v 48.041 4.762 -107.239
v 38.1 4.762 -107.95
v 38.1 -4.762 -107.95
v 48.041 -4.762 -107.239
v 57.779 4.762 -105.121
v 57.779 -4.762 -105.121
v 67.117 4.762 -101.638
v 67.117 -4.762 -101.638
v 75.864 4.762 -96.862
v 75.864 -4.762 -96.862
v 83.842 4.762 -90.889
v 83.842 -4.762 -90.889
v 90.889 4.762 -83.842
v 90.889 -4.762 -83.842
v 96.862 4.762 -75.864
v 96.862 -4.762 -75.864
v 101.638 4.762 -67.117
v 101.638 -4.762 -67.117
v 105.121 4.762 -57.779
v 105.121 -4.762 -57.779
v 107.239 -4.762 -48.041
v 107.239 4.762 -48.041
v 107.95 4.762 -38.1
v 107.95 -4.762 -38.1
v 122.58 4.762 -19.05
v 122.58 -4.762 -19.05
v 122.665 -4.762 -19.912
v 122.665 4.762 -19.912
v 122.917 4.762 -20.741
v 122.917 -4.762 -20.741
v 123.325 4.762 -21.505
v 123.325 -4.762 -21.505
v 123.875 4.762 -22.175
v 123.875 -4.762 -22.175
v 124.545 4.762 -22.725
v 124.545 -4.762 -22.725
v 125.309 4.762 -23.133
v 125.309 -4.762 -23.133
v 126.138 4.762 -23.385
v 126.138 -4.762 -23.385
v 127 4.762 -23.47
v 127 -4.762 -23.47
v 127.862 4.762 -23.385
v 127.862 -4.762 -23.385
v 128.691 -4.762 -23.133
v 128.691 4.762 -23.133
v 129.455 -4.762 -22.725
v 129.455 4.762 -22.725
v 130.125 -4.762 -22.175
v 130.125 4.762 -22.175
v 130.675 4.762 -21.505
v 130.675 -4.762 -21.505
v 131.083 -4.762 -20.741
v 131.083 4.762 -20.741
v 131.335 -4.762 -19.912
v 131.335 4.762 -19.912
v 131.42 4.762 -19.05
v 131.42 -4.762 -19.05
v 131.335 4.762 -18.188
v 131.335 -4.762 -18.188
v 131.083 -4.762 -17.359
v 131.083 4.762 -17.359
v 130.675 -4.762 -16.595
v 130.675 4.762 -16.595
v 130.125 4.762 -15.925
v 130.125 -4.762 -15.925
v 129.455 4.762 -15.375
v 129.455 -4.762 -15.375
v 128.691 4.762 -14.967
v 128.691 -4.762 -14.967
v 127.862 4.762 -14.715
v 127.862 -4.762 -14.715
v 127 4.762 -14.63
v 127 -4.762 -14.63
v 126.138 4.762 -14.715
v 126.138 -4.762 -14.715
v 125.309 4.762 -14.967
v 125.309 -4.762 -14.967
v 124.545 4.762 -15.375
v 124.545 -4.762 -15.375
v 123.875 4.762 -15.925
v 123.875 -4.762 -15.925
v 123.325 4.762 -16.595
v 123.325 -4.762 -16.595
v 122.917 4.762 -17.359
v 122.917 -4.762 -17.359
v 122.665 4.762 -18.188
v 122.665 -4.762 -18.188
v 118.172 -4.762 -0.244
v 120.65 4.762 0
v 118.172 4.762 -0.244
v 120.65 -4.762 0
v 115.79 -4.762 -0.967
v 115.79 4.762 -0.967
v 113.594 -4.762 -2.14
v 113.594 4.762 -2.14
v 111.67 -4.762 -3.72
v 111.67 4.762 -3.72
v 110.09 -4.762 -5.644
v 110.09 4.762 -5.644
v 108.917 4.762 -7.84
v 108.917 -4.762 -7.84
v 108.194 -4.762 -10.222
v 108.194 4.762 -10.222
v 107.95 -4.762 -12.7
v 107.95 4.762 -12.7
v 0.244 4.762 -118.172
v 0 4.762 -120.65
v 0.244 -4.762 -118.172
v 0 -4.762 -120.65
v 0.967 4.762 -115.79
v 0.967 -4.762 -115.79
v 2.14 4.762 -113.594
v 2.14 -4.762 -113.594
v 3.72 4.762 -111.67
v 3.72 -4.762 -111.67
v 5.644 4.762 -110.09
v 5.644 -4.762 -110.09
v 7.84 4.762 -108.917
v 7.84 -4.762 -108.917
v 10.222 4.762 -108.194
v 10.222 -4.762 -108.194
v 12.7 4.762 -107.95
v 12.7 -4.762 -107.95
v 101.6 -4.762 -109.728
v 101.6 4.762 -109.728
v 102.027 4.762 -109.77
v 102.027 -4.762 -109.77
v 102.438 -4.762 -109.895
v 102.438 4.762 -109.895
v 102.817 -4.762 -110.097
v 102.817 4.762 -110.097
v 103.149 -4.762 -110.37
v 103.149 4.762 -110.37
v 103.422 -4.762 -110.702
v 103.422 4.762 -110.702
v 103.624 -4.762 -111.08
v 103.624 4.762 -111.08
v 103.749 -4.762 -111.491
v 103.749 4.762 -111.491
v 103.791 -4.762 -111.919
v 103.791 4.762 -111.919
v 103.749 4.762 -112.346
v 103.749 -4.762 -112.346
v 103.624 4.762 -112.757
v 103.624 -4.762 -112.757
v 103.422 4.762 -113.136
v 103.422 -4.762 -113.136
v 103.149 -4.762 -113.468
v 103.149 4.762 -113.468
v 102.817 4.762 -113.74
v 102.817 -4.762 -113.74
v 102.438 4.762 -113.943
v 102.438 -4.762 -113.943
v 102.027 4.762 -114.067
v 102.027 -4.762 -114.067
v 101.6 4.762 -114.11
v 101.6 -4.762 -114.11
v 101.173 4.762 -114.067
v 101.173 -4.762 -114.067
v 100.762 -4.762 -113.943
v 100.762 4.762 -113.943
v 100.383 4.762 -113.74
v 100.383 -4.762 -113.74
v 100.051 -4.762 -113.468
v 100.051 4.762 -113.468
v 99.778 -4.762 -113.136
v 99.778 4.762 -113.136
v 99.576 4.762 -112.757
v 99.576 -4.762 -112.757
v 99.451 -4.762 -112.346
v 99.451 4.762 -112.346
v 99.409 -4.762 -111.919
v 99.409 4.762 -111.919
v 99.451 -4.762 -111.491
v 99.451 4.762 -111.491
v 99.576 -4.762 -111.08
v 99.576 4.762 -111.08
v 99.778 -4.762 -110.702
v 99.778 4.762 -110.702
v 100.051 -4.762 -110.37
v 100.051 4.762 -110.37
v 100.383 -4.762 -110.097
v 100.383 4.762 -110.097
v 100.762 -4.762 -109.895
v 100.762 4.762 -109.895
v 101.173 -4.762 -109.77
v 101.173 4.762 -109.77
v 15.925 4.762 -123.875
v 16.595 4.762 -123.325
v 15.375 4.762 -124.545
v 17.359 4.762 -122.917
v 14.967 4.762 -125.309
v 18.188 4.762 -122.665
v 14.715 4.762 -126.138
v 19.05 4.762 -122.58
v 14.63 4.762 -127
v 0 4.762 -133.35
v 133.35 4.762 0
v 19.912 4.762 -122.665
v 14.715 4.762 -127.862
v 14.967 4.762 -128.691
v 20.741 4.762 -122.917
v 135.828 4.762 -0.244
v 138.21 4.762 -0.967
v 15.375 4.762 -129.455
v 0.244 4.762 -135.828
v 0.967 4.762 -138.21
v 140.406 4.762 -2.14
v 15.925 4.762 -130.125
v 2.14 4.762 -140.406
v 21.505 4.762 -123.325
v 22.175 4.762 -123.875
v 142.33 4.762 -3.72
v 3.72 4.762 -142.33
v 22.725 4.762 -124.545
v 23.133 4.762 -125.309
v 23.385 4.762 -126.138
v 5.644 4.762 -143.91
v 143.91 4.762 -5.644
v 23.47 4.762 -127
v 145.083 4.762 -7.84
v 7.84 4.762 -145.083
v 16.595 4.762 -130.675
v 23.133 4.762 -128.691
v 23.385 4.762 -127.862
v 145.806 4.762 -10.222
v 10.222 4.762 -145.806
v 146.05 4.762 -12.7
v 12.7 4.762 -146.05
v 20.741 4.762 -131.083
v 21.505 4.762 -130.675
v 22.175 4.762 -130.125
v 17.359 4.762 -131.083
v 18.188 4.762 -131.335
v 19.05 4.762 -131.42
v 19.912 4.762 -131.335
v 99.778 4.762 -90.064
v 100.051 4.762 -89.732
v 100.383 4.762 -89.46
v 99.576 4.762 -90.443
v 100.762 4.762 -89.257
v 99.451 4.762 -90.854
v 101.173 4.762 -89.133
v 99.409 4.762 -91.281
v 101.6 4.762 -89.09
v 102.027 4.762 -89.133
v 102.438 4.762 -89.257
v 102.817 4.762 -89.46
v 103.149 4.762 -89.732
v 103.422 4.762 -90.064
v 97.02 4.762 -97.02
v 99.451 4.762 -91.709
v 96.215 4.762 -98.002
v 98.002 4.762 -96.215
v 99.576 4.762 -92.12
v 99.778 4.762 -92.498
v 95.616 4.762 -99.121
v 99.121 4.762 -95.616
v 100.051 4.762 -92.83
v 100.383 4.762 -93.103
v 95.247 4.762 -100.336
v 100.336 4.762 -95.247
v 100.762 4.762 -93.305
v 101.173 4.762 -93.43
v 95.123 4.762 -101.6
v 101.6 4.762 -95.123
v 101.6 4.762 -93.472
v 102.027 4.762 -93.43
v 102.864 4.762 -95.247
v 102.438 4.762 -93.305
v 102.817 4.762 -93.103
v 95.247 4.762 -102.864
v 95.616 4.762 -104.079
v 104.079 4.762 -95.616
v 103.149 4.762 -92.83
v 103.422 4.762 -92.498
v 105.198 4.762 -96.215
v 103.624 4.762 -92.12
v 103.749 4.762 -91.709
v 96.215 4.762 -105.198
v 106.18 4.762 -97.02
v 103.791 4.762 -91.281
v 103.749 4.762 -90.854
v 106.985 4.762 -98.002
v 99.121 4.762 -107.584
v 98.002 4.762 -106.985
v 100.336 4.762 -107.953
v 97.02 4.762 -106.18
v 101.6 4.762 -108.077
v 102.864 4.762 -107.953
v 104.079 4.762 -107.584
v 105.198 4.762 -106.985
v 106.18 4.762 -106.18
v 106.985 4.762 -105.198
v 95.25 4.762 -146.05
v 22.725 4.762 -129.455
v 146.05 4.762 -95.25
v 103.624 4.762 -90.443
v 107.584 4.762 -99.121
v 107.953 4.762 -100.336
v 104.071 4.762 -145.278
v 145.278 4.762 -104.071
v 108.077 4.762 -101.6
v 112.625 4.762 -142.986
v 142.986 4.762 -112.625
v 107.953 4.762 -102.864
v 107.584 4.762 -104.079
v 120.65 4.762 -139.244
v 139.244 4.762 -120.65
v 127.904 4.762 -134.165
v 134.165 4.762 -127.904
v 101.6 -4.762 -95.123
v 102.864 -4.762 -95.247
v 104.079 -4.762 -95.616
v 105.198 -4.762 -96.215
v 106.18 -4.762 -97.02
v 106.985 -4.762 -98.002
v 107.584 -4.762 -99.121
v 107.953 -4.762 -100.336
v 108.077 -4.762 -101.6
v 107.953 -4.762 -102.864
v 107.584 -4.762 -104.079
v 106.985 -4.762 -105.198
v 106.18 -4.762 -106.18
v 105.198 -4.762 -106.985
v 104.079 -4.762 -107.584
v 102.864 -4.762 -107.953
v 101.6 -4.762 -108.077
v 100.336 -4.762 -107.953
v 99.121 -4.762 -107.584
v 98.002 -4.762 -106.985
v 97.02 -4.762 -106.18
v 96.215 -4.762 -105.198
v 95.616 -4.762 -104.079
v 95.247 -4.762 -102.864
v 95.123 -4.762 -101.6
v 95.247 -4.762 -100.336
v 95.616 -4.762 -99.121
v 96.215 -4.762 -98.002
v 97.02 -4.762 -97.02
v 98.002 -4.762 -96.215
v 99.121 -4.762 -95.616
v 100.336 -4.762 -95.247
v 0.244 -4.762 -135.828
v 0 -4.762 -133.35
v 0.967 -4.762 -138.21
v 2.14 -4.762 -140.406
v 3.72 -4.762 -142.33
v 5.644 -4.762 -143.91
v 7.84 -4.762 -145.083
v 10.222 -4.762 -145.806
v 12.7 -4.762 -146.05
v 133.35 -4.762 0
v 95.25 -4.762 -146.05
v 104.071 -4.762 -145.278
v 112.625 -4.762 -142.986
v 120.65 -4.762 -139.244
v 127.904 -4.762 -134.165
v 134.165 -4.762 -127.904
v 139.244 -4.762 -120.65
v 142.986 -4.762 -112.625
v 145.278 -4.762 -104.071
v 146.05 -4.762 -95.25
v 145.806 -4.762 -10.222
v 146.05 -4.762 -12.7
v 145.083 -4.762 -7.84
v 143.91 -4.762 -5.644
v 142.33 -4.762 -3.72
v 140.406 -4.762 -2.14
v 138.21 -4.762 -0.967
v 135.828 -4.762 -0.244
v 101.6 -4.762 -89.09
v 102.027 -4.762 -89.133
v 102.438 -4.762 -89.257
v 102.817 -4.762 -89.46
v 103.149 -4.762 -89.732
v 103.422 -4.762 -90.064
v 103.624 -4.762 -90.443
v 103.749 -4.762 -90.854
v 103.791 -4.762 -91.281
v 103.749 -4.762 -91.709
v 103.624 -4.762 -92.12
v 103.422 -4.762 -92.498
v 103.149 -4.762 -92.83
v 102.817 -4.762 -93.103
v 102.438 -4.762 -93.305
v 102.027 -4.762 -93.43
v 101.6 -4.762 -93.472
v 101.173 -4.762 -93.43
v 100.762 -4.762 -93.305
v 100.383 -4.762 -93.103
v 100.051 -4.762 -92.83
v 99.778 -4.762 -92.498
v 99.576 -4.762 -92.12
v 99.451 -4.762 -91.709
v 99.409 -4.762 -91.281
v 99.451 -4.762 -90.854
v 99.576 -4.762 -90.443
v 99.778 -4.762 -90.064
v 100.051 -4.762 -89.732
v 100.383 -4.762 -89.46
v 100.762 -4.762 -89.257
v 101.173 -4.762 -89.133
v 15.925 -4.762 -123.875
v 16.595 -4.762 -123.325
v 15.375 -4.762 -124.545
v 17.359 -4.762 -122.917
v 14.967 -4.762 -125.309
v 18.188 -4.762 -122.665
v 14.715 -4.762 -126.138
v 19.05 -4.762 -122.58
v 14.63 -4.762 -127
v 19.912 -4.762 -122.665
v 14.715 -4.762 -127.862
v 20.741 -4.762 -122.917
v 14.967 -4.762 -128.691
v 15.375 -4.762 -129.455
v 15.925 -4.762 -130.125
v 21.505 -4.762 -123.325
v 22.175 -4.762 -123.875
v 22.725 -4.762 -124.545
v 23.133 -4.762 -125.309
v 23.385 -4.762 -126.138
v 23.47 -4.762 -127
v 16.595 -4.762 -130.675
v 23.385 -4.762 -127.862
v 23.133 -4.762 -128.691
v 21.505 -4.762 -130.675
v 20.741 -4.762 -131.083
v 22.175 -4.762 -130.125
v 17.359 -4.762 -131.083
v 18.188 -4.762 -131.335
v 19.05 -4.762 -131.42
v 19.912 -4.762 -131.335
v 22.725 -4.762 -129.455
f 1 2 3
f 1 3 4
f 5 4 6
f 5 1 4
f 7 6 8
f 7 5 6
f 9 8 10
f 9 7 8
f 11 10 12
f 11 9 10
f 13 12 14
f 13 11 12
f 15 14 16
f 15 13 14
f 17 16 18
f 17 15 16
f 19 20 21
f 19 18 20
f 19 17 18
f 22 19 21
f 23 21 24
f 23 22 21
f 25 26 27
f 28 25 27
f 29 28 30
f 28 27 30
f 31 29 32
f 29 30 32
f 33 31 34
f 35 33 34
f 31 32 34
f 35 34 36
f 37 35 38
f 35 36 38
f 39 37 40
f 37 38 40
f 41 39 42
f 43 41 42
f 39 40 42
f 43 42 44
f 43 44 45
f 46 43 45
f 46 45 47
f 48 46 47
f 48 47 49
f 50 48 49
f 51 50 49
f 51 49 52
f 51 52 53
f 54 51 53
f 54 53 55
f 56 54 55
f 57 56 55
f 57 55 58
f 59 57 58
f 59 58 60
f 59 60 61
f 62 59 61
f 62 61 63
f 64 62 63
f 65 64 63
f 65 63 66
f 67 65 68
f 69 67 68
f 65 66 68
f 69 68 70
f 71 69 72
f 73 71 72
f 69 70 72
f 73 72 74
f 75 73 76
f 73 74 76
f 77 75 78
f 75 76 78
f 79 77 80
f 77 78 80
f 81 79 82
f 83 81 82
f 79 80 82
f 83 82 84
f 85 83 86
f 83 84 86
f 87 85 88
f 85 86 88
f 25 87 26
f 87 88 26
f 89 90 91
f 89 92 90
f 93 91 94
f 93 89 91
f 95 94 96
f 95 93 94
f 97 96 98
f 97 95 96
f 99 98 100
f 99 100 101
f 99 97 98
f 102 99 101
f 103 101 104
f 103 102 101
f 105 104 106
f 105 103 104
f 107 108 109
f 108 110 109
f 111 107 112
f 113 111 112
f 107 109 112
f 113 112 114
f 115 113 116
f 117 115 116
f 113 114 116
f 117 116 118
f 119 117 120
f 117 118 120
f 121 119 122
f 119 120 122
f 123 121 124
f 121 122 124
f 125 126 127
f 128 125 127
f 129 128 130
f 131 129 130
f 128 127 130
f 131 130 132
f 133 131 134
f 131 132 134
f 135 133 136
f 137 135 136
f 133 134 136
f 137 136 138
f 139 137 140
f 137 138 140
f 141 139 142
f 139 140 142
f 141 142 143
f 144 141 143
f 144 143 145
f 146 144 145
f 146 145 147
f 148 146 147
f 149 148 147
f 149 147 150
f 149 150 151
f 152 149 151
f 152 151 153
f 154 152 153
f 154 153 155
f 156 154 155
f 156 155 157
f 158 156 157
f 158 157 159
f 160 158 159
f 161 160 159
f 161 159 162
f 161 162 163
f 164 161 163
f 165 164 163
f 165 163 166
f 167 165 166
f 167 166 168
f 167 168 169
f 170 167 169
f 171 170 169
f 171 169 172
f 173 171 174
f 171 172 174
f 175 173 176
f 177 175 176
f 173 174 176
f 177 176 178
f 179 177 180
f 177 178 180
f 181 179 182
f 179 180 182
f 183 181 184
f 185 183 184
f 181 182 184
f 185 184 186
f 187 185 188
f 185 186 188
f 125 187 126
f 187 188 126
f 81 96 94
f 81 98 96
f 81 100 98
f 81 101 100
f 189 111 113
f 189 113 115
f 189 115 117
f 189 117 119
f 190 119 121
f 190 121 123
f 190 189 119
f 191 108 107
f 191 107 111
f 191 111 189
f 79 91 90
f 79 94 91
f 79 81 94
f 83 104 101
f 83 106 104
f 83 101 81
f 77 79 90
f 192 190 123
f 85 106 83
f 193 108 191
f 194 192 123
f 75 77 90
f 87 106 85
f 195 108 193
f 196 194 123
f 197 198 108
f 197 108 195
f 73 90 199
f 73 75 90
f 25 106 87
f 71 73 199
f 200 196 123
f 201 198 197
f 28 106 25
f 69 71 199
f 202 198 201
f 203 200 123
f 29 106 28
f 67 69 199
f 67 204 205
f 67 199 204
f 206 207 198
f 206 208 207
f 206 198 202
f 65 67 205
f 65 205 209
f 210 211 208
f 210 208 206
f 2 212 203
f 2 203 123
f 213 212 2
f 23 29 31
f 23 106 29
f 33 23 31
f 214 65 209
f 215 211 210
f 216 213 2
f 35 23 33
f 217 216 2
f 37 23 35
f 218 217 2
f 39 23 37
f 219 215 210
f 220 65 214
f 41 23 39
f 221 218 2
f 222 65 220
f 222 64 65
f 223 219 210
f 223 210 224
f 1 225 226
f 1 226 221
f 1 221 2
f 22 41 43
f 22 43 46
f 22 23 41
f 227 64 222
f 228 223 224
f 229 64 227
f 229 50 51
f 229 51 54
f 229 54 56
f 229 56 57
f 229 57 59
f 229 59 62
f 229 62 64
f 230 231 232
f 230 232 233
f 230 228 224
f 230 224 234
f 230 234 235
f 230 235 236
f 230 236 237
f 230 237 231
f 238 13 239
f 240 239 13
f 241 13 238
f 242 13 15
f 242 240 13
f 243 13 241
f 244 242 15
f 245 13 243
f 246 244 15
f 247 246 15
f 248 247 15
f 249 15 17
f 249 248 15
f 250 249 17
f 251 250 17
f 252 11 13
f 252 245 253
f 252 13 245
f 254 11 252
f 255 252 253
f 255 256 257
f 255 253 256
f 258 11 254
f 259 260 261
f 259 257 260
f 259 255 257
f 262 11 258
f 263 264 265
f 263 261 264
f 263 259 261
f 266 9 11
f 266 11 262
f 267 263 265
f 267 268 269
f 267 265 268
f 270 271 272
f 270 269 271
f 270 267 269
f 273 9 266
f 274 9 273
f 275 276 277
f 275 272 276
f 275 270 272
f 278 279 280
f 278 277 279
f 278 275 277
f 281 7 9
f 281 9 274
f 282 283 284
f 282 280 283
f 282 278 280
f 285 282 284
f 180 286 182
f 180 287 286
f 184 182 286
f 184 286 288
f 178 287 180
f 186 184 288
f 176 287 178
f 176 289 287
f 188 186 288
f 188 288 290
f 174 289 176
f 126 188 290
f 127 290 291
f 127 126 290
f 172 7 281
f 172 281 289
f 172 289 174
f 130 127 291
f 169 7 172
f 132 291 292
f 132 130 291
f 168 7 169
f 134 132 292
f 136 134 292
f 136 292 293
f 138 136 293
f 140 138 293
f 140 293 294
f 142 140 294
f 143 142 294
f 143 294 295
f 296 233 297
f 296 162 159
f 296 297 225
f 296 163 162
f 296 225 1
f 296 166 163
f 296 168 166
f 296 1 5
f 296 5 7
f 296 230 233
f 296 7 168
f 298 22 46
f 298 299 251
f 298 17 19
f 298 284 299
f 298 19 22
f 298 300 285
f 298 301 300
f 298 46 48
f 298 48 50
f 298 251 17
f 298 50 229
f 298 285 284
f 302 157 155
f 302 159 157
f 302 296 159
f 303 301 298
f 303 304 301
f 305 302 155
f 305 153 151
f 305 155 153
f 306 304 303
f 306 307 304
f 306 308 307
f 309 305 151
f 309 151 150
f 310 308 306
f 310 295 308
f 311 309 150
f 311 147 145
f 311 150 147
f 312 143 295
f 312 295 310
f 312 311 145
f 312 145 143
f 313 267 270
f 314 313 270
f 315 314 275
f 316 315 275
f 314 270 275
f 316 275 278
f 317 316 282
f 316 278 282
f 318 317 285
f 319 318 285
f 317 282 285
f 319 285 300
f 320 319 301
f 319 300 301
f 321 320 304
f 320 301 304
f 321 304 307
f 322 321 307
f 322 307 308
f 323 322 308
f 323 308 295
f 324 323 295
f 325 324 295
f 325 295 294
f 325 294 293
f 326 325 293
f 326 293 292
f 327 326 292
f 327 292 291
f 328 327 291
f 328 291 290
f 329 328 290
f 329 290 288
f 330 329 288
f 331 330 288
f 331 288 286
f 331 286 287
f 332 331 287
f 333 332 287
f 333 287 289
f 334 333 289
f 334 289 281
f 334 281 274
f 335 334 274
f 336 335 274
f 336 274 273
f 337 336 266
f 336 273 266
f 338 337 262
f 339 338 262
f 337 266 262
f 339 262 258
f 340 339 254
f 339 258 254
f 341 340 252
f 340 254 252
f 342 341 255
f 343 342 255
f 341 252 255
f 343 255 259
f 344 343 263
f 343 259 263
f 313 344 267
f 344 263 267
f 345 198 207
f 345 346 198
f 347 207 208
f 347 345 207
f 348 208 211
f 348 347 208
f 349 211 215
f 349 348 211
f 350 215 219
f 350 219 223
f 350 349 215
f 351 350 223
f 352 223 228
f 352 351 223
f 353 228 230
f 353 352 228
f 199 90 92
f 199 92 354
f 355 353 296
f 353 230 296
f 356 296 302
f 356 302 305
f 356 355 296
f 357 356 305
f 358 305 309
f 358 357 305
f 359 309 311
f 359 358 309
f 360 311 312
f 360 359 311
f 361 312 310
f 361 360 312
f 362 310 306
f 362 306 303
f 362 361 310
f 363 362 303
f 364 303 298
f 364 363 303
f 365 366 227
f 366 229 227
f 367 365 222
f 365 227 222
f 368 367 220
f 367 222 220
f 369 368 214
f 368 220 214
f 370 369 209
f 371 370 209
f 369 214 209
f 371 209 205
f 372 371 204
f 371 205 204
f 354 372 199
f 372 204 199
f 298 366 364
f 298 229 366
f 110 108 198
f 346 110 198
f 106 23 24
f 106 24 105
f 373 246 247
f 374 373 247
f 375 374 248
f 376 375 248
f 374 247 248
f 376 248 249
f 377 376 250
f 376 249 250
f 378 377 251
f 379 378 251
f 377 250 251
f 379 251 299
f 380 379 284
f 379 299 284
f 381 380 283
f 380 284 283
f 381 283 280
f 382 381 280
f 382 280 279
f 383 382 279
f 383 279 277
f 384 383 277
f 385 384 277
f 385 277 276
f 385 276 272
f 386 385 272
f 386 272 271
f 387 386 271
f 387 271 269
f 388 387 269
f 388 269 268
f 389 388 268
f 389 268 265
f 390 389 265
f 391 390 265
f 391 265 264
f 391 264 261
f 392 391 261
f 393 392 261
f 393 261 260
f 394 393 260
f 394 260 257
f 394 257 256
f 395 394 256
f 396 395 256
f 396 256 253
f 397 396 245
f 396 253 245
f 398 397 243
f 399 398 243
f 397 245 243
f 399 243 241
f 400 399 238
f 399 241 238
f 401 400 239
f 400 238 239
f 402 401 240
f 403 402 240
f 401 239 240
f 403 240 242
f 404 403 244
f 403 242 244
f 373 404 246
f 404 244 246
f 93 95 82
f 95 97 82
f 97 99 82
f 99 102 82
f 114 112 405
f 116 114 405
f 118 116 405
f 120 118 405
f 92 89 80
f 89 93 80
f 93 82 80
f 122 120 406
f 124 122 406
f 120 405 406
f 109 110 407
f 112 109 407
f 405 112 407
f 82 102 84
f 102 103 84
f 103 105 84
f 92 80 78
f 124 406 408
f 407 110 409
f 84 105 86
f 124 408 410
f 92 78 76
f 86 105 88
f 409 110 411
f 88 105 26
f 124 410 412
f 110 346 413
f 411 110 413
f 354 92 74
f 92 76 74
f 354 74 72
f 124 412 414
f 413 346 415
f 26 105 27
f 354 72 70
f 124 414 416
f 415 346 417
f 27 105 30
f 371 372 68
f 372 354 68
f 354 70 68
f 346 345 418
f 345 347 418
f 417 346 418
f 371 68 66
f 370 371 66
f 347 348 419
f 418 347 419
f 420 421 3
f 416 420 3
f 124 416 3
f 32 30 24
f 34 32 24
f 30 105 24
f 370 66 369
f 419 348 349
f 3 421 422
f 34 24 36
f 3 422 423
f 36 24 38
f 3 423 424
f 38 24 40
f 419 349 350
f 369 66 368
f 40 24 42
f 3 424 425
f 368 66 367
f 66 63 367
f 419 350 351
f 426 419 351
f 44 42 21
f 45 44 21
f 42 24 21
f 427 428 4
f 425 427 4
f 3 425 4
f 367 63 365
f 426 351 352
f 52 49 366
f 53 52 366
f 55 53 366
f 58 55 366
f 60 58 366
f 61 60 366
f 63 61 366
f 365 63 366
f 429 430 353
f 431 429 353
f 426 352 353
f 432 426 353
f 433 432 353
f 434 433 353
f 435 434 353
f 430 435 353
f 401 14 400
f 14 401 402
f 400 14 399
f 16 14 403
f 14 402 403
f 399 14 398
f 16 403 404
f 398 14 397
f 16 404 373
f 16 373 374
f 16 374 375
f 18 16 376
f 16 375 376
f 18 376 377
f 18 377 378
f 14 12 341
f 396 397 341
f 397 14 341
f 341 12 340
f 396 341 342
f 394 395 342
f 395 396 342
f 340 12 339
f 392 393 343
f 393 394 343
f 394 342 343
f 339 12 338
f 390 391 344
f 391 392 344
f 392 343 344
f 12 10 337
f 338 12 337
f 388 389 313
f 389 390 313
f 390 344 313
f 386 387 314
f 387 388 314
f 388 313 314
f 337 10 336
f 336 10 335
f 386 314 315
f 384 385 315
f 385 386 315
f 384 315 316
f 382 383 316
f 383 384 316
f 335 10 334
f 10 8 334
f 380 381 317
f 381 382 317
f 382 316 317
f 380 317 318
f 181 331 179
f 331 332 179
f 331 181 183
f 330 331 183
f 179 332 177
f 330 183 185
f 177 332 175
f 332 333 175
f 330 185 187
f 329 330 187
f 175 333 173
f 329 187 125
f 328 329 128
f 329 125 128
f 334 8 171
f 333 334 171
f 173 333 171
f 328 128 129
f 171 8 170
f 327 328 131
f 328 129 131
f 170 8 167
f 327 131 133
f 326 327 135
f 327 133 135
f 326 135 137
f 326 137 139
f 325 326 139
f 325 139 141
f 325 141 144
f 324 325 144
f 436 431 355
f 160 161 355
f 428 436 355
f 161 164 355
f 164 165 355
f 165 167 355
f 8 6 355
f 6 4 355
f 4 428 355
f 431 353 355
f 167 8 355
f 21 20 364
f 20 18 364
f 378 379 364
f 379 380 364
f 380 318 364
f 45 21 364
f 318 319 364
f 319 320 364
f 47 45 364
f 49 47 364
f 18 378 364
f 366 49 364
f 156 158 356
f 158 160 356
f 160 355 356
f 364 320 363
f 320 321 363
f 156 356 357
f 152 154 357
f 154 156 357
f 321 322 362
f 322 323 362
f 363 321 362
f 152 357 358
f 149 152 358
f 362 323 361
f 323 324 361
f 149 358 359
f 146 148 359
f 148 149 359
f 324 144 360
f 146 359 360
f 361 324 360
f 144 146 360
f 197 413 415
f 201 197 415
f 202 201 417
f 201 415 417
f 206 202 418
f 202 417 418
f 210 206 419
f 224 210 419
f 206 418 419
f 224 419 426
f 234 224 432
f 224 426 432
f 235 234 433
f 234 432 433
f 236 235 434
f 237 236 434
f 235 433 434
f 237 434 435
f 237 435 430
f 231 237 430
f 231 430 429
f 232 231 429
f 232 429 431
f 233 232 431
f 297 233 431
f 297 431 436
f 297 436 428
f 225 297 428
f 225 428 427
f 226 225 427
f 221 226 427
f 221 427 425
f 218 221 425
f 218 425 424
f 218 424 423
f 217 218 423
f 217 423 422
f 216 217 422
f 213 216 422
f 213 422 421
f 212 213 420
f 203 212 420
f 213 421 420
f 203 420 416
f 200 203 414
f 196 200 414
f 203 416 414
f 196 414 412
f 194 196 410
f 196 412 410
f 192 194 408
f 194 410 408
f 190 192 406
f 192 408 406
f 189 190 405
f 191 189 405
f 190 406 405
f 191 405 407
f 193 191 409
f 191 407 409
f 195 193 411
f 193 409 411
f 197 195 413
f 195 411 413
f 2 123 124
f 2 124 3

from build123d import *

# Parameters (mm, degrees)
SKETCH1_W                = 146.05
SKETCH1_H                = 146.05
BOSS_EXTRUDE1_DEPTH      = 4.7625
SKETCH2_R                = 6.477
SKETCH2_R_2              = 2.19075
CUT_EXTRUDE1_DEPTH       = 207.765399971
S_0_348_DIAMETER_HOLE1_D = 8.8392
CUT_EXTRUDE2_DEPTH       = 207.765399971
FILLET1_R                = 12.7
FILLET2_R                = 50.8


with BuildPart() as part:
    # Sketch1 → Boss-Extrude1 (new, symmetric)
    with BuildSketch(Plane(origin=(0, 0, 0), x_dir=(1, 0, 0), z_dir=(0, 1, 0))):
        with Locations((73.025, 73.025)):
            Rectangle(SKETCH1_W, SKETCH1_H)
    extrude(amount=BOSS_EXTRUDE1_DEPTH, both=True)

    # Sketch2 → Cut-Extrude1 (cut, through all)
    with BuildSketch(Plane(origin=(0, 4.7625, 0), x_dir=(1, 0, 0), z_dir=(0, 1, 0))):
        with Locations(Location((101.6, 101.6, 0), (0, 0, 270))):
            Circle(SKETCH2_R)
        with Locations(Location((101.6, 91.28125, 0), (0, 0, 270))):
            Circle(SKETCH2_R_2)
        with Locations(Location((101.6, 111.91875, 0), (0, 0, 270))):
            Circle(SKETCH2_R_2)
    extrude(amount=-CUT_EXTRUDE1_DEPTH, mode=Mode.SUBTRACT)

    # S (0.348) Diameter Hole1 (through all)
    with Locations(Plane(origin=(0, 4.7625, 0), x_dir=(1, 0, 0), z_dir=(0, 1, 0))):
        with Locations((19.05, 127), (127, 19.05), (57.15, 19.05), (19.05, 57.15)):
            Hole(S_0_348_DIAMETER_HOLE1_D / 2)

    # Sketch5 → Cut-Extrude2 (cut, through all)
    with BuildSketch(Plane(origin=(0, 4.7625, 0), x_dir=(1, 0, 0), z_dir=(0, 1, 0))):
        with BuildLine():
            Line((0, 107.95), (38.1, 107.95))
            ThreePointArc((38.1, 107.95), (87.491408666, 87.491408666), (107.95, 38.1))
            Line((107.95, 38.1), (107.95, 0))
            Line((107.95, 0), (0, 0))
            Line((0, 0), (0, 107.95))
        make_face()
    extrude(amount=-CUT_EXTRUDE2_DEPTH, mode=Mode.SUBTRACT)

    # Fillet1
    fillet1_edges = [part.edges().sort_by_distance(p)[0] for p in [
        (0, 0, -107.95),
        (107.95, 0, 0),
        (0, 0, -146.05),
        (146.05, 0, 0),
    ]]
    fillet(fillet1_edges, radius=FILLET1_R)

    # Fillet2
    fillet2_edges = [part.edges().sort_by_distance(p)[0] for p in [
        (146.05, 0, -146.05),
    ]]
    fillet(fillet2_edges, radius=FILLET2_R)


solid = part.part
